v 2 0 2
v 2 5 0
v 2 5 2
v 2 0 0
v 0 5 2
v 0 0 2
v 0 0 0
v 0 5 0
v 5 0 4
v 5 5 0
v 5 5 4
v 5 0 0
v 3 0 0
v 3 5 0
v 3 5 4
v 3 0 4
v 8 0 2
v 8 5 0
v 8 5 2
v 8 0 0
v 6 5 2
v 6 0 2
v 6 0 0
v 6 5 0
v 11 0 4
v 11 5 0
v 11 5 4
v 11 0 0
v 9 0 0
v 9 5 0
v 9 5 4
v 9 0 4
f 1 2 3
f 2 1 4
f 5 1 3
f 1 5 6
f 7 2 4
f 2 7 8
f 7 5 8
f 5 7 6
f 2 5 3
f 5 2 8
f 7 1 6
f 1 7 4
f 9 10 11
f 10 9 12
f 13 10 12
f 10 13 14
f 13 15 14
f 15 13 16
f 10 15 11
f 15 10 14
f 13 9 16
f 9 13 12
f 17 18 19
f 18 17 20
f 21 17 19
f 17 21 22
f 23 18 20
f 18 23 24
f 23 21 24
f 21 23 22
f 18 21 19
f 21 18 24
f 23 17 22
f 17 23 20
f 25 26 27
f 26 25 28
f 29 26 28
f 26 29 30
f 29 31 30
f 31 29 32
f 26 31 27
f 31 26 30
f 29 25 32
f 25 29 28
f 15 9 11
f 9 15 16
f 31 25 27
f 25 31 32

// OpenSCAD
union() {
  translate([0, 0, 0]) cube(size=[2,5,2], center=false);
  translate([3, 0, 0]) cube(size=[2,5,2], center=false);
  translate([6, 0, 0]) cube(size=[2,5,2], center=false);
  translate([9, 0, 0]) cube(size=[2,5,2], center=false);

  translate([3, 0, 2]) cube(size=[2,5,2], center=false);
  translate([9, 0, 2]) cube(size=[2,5,2], center=false);
}
